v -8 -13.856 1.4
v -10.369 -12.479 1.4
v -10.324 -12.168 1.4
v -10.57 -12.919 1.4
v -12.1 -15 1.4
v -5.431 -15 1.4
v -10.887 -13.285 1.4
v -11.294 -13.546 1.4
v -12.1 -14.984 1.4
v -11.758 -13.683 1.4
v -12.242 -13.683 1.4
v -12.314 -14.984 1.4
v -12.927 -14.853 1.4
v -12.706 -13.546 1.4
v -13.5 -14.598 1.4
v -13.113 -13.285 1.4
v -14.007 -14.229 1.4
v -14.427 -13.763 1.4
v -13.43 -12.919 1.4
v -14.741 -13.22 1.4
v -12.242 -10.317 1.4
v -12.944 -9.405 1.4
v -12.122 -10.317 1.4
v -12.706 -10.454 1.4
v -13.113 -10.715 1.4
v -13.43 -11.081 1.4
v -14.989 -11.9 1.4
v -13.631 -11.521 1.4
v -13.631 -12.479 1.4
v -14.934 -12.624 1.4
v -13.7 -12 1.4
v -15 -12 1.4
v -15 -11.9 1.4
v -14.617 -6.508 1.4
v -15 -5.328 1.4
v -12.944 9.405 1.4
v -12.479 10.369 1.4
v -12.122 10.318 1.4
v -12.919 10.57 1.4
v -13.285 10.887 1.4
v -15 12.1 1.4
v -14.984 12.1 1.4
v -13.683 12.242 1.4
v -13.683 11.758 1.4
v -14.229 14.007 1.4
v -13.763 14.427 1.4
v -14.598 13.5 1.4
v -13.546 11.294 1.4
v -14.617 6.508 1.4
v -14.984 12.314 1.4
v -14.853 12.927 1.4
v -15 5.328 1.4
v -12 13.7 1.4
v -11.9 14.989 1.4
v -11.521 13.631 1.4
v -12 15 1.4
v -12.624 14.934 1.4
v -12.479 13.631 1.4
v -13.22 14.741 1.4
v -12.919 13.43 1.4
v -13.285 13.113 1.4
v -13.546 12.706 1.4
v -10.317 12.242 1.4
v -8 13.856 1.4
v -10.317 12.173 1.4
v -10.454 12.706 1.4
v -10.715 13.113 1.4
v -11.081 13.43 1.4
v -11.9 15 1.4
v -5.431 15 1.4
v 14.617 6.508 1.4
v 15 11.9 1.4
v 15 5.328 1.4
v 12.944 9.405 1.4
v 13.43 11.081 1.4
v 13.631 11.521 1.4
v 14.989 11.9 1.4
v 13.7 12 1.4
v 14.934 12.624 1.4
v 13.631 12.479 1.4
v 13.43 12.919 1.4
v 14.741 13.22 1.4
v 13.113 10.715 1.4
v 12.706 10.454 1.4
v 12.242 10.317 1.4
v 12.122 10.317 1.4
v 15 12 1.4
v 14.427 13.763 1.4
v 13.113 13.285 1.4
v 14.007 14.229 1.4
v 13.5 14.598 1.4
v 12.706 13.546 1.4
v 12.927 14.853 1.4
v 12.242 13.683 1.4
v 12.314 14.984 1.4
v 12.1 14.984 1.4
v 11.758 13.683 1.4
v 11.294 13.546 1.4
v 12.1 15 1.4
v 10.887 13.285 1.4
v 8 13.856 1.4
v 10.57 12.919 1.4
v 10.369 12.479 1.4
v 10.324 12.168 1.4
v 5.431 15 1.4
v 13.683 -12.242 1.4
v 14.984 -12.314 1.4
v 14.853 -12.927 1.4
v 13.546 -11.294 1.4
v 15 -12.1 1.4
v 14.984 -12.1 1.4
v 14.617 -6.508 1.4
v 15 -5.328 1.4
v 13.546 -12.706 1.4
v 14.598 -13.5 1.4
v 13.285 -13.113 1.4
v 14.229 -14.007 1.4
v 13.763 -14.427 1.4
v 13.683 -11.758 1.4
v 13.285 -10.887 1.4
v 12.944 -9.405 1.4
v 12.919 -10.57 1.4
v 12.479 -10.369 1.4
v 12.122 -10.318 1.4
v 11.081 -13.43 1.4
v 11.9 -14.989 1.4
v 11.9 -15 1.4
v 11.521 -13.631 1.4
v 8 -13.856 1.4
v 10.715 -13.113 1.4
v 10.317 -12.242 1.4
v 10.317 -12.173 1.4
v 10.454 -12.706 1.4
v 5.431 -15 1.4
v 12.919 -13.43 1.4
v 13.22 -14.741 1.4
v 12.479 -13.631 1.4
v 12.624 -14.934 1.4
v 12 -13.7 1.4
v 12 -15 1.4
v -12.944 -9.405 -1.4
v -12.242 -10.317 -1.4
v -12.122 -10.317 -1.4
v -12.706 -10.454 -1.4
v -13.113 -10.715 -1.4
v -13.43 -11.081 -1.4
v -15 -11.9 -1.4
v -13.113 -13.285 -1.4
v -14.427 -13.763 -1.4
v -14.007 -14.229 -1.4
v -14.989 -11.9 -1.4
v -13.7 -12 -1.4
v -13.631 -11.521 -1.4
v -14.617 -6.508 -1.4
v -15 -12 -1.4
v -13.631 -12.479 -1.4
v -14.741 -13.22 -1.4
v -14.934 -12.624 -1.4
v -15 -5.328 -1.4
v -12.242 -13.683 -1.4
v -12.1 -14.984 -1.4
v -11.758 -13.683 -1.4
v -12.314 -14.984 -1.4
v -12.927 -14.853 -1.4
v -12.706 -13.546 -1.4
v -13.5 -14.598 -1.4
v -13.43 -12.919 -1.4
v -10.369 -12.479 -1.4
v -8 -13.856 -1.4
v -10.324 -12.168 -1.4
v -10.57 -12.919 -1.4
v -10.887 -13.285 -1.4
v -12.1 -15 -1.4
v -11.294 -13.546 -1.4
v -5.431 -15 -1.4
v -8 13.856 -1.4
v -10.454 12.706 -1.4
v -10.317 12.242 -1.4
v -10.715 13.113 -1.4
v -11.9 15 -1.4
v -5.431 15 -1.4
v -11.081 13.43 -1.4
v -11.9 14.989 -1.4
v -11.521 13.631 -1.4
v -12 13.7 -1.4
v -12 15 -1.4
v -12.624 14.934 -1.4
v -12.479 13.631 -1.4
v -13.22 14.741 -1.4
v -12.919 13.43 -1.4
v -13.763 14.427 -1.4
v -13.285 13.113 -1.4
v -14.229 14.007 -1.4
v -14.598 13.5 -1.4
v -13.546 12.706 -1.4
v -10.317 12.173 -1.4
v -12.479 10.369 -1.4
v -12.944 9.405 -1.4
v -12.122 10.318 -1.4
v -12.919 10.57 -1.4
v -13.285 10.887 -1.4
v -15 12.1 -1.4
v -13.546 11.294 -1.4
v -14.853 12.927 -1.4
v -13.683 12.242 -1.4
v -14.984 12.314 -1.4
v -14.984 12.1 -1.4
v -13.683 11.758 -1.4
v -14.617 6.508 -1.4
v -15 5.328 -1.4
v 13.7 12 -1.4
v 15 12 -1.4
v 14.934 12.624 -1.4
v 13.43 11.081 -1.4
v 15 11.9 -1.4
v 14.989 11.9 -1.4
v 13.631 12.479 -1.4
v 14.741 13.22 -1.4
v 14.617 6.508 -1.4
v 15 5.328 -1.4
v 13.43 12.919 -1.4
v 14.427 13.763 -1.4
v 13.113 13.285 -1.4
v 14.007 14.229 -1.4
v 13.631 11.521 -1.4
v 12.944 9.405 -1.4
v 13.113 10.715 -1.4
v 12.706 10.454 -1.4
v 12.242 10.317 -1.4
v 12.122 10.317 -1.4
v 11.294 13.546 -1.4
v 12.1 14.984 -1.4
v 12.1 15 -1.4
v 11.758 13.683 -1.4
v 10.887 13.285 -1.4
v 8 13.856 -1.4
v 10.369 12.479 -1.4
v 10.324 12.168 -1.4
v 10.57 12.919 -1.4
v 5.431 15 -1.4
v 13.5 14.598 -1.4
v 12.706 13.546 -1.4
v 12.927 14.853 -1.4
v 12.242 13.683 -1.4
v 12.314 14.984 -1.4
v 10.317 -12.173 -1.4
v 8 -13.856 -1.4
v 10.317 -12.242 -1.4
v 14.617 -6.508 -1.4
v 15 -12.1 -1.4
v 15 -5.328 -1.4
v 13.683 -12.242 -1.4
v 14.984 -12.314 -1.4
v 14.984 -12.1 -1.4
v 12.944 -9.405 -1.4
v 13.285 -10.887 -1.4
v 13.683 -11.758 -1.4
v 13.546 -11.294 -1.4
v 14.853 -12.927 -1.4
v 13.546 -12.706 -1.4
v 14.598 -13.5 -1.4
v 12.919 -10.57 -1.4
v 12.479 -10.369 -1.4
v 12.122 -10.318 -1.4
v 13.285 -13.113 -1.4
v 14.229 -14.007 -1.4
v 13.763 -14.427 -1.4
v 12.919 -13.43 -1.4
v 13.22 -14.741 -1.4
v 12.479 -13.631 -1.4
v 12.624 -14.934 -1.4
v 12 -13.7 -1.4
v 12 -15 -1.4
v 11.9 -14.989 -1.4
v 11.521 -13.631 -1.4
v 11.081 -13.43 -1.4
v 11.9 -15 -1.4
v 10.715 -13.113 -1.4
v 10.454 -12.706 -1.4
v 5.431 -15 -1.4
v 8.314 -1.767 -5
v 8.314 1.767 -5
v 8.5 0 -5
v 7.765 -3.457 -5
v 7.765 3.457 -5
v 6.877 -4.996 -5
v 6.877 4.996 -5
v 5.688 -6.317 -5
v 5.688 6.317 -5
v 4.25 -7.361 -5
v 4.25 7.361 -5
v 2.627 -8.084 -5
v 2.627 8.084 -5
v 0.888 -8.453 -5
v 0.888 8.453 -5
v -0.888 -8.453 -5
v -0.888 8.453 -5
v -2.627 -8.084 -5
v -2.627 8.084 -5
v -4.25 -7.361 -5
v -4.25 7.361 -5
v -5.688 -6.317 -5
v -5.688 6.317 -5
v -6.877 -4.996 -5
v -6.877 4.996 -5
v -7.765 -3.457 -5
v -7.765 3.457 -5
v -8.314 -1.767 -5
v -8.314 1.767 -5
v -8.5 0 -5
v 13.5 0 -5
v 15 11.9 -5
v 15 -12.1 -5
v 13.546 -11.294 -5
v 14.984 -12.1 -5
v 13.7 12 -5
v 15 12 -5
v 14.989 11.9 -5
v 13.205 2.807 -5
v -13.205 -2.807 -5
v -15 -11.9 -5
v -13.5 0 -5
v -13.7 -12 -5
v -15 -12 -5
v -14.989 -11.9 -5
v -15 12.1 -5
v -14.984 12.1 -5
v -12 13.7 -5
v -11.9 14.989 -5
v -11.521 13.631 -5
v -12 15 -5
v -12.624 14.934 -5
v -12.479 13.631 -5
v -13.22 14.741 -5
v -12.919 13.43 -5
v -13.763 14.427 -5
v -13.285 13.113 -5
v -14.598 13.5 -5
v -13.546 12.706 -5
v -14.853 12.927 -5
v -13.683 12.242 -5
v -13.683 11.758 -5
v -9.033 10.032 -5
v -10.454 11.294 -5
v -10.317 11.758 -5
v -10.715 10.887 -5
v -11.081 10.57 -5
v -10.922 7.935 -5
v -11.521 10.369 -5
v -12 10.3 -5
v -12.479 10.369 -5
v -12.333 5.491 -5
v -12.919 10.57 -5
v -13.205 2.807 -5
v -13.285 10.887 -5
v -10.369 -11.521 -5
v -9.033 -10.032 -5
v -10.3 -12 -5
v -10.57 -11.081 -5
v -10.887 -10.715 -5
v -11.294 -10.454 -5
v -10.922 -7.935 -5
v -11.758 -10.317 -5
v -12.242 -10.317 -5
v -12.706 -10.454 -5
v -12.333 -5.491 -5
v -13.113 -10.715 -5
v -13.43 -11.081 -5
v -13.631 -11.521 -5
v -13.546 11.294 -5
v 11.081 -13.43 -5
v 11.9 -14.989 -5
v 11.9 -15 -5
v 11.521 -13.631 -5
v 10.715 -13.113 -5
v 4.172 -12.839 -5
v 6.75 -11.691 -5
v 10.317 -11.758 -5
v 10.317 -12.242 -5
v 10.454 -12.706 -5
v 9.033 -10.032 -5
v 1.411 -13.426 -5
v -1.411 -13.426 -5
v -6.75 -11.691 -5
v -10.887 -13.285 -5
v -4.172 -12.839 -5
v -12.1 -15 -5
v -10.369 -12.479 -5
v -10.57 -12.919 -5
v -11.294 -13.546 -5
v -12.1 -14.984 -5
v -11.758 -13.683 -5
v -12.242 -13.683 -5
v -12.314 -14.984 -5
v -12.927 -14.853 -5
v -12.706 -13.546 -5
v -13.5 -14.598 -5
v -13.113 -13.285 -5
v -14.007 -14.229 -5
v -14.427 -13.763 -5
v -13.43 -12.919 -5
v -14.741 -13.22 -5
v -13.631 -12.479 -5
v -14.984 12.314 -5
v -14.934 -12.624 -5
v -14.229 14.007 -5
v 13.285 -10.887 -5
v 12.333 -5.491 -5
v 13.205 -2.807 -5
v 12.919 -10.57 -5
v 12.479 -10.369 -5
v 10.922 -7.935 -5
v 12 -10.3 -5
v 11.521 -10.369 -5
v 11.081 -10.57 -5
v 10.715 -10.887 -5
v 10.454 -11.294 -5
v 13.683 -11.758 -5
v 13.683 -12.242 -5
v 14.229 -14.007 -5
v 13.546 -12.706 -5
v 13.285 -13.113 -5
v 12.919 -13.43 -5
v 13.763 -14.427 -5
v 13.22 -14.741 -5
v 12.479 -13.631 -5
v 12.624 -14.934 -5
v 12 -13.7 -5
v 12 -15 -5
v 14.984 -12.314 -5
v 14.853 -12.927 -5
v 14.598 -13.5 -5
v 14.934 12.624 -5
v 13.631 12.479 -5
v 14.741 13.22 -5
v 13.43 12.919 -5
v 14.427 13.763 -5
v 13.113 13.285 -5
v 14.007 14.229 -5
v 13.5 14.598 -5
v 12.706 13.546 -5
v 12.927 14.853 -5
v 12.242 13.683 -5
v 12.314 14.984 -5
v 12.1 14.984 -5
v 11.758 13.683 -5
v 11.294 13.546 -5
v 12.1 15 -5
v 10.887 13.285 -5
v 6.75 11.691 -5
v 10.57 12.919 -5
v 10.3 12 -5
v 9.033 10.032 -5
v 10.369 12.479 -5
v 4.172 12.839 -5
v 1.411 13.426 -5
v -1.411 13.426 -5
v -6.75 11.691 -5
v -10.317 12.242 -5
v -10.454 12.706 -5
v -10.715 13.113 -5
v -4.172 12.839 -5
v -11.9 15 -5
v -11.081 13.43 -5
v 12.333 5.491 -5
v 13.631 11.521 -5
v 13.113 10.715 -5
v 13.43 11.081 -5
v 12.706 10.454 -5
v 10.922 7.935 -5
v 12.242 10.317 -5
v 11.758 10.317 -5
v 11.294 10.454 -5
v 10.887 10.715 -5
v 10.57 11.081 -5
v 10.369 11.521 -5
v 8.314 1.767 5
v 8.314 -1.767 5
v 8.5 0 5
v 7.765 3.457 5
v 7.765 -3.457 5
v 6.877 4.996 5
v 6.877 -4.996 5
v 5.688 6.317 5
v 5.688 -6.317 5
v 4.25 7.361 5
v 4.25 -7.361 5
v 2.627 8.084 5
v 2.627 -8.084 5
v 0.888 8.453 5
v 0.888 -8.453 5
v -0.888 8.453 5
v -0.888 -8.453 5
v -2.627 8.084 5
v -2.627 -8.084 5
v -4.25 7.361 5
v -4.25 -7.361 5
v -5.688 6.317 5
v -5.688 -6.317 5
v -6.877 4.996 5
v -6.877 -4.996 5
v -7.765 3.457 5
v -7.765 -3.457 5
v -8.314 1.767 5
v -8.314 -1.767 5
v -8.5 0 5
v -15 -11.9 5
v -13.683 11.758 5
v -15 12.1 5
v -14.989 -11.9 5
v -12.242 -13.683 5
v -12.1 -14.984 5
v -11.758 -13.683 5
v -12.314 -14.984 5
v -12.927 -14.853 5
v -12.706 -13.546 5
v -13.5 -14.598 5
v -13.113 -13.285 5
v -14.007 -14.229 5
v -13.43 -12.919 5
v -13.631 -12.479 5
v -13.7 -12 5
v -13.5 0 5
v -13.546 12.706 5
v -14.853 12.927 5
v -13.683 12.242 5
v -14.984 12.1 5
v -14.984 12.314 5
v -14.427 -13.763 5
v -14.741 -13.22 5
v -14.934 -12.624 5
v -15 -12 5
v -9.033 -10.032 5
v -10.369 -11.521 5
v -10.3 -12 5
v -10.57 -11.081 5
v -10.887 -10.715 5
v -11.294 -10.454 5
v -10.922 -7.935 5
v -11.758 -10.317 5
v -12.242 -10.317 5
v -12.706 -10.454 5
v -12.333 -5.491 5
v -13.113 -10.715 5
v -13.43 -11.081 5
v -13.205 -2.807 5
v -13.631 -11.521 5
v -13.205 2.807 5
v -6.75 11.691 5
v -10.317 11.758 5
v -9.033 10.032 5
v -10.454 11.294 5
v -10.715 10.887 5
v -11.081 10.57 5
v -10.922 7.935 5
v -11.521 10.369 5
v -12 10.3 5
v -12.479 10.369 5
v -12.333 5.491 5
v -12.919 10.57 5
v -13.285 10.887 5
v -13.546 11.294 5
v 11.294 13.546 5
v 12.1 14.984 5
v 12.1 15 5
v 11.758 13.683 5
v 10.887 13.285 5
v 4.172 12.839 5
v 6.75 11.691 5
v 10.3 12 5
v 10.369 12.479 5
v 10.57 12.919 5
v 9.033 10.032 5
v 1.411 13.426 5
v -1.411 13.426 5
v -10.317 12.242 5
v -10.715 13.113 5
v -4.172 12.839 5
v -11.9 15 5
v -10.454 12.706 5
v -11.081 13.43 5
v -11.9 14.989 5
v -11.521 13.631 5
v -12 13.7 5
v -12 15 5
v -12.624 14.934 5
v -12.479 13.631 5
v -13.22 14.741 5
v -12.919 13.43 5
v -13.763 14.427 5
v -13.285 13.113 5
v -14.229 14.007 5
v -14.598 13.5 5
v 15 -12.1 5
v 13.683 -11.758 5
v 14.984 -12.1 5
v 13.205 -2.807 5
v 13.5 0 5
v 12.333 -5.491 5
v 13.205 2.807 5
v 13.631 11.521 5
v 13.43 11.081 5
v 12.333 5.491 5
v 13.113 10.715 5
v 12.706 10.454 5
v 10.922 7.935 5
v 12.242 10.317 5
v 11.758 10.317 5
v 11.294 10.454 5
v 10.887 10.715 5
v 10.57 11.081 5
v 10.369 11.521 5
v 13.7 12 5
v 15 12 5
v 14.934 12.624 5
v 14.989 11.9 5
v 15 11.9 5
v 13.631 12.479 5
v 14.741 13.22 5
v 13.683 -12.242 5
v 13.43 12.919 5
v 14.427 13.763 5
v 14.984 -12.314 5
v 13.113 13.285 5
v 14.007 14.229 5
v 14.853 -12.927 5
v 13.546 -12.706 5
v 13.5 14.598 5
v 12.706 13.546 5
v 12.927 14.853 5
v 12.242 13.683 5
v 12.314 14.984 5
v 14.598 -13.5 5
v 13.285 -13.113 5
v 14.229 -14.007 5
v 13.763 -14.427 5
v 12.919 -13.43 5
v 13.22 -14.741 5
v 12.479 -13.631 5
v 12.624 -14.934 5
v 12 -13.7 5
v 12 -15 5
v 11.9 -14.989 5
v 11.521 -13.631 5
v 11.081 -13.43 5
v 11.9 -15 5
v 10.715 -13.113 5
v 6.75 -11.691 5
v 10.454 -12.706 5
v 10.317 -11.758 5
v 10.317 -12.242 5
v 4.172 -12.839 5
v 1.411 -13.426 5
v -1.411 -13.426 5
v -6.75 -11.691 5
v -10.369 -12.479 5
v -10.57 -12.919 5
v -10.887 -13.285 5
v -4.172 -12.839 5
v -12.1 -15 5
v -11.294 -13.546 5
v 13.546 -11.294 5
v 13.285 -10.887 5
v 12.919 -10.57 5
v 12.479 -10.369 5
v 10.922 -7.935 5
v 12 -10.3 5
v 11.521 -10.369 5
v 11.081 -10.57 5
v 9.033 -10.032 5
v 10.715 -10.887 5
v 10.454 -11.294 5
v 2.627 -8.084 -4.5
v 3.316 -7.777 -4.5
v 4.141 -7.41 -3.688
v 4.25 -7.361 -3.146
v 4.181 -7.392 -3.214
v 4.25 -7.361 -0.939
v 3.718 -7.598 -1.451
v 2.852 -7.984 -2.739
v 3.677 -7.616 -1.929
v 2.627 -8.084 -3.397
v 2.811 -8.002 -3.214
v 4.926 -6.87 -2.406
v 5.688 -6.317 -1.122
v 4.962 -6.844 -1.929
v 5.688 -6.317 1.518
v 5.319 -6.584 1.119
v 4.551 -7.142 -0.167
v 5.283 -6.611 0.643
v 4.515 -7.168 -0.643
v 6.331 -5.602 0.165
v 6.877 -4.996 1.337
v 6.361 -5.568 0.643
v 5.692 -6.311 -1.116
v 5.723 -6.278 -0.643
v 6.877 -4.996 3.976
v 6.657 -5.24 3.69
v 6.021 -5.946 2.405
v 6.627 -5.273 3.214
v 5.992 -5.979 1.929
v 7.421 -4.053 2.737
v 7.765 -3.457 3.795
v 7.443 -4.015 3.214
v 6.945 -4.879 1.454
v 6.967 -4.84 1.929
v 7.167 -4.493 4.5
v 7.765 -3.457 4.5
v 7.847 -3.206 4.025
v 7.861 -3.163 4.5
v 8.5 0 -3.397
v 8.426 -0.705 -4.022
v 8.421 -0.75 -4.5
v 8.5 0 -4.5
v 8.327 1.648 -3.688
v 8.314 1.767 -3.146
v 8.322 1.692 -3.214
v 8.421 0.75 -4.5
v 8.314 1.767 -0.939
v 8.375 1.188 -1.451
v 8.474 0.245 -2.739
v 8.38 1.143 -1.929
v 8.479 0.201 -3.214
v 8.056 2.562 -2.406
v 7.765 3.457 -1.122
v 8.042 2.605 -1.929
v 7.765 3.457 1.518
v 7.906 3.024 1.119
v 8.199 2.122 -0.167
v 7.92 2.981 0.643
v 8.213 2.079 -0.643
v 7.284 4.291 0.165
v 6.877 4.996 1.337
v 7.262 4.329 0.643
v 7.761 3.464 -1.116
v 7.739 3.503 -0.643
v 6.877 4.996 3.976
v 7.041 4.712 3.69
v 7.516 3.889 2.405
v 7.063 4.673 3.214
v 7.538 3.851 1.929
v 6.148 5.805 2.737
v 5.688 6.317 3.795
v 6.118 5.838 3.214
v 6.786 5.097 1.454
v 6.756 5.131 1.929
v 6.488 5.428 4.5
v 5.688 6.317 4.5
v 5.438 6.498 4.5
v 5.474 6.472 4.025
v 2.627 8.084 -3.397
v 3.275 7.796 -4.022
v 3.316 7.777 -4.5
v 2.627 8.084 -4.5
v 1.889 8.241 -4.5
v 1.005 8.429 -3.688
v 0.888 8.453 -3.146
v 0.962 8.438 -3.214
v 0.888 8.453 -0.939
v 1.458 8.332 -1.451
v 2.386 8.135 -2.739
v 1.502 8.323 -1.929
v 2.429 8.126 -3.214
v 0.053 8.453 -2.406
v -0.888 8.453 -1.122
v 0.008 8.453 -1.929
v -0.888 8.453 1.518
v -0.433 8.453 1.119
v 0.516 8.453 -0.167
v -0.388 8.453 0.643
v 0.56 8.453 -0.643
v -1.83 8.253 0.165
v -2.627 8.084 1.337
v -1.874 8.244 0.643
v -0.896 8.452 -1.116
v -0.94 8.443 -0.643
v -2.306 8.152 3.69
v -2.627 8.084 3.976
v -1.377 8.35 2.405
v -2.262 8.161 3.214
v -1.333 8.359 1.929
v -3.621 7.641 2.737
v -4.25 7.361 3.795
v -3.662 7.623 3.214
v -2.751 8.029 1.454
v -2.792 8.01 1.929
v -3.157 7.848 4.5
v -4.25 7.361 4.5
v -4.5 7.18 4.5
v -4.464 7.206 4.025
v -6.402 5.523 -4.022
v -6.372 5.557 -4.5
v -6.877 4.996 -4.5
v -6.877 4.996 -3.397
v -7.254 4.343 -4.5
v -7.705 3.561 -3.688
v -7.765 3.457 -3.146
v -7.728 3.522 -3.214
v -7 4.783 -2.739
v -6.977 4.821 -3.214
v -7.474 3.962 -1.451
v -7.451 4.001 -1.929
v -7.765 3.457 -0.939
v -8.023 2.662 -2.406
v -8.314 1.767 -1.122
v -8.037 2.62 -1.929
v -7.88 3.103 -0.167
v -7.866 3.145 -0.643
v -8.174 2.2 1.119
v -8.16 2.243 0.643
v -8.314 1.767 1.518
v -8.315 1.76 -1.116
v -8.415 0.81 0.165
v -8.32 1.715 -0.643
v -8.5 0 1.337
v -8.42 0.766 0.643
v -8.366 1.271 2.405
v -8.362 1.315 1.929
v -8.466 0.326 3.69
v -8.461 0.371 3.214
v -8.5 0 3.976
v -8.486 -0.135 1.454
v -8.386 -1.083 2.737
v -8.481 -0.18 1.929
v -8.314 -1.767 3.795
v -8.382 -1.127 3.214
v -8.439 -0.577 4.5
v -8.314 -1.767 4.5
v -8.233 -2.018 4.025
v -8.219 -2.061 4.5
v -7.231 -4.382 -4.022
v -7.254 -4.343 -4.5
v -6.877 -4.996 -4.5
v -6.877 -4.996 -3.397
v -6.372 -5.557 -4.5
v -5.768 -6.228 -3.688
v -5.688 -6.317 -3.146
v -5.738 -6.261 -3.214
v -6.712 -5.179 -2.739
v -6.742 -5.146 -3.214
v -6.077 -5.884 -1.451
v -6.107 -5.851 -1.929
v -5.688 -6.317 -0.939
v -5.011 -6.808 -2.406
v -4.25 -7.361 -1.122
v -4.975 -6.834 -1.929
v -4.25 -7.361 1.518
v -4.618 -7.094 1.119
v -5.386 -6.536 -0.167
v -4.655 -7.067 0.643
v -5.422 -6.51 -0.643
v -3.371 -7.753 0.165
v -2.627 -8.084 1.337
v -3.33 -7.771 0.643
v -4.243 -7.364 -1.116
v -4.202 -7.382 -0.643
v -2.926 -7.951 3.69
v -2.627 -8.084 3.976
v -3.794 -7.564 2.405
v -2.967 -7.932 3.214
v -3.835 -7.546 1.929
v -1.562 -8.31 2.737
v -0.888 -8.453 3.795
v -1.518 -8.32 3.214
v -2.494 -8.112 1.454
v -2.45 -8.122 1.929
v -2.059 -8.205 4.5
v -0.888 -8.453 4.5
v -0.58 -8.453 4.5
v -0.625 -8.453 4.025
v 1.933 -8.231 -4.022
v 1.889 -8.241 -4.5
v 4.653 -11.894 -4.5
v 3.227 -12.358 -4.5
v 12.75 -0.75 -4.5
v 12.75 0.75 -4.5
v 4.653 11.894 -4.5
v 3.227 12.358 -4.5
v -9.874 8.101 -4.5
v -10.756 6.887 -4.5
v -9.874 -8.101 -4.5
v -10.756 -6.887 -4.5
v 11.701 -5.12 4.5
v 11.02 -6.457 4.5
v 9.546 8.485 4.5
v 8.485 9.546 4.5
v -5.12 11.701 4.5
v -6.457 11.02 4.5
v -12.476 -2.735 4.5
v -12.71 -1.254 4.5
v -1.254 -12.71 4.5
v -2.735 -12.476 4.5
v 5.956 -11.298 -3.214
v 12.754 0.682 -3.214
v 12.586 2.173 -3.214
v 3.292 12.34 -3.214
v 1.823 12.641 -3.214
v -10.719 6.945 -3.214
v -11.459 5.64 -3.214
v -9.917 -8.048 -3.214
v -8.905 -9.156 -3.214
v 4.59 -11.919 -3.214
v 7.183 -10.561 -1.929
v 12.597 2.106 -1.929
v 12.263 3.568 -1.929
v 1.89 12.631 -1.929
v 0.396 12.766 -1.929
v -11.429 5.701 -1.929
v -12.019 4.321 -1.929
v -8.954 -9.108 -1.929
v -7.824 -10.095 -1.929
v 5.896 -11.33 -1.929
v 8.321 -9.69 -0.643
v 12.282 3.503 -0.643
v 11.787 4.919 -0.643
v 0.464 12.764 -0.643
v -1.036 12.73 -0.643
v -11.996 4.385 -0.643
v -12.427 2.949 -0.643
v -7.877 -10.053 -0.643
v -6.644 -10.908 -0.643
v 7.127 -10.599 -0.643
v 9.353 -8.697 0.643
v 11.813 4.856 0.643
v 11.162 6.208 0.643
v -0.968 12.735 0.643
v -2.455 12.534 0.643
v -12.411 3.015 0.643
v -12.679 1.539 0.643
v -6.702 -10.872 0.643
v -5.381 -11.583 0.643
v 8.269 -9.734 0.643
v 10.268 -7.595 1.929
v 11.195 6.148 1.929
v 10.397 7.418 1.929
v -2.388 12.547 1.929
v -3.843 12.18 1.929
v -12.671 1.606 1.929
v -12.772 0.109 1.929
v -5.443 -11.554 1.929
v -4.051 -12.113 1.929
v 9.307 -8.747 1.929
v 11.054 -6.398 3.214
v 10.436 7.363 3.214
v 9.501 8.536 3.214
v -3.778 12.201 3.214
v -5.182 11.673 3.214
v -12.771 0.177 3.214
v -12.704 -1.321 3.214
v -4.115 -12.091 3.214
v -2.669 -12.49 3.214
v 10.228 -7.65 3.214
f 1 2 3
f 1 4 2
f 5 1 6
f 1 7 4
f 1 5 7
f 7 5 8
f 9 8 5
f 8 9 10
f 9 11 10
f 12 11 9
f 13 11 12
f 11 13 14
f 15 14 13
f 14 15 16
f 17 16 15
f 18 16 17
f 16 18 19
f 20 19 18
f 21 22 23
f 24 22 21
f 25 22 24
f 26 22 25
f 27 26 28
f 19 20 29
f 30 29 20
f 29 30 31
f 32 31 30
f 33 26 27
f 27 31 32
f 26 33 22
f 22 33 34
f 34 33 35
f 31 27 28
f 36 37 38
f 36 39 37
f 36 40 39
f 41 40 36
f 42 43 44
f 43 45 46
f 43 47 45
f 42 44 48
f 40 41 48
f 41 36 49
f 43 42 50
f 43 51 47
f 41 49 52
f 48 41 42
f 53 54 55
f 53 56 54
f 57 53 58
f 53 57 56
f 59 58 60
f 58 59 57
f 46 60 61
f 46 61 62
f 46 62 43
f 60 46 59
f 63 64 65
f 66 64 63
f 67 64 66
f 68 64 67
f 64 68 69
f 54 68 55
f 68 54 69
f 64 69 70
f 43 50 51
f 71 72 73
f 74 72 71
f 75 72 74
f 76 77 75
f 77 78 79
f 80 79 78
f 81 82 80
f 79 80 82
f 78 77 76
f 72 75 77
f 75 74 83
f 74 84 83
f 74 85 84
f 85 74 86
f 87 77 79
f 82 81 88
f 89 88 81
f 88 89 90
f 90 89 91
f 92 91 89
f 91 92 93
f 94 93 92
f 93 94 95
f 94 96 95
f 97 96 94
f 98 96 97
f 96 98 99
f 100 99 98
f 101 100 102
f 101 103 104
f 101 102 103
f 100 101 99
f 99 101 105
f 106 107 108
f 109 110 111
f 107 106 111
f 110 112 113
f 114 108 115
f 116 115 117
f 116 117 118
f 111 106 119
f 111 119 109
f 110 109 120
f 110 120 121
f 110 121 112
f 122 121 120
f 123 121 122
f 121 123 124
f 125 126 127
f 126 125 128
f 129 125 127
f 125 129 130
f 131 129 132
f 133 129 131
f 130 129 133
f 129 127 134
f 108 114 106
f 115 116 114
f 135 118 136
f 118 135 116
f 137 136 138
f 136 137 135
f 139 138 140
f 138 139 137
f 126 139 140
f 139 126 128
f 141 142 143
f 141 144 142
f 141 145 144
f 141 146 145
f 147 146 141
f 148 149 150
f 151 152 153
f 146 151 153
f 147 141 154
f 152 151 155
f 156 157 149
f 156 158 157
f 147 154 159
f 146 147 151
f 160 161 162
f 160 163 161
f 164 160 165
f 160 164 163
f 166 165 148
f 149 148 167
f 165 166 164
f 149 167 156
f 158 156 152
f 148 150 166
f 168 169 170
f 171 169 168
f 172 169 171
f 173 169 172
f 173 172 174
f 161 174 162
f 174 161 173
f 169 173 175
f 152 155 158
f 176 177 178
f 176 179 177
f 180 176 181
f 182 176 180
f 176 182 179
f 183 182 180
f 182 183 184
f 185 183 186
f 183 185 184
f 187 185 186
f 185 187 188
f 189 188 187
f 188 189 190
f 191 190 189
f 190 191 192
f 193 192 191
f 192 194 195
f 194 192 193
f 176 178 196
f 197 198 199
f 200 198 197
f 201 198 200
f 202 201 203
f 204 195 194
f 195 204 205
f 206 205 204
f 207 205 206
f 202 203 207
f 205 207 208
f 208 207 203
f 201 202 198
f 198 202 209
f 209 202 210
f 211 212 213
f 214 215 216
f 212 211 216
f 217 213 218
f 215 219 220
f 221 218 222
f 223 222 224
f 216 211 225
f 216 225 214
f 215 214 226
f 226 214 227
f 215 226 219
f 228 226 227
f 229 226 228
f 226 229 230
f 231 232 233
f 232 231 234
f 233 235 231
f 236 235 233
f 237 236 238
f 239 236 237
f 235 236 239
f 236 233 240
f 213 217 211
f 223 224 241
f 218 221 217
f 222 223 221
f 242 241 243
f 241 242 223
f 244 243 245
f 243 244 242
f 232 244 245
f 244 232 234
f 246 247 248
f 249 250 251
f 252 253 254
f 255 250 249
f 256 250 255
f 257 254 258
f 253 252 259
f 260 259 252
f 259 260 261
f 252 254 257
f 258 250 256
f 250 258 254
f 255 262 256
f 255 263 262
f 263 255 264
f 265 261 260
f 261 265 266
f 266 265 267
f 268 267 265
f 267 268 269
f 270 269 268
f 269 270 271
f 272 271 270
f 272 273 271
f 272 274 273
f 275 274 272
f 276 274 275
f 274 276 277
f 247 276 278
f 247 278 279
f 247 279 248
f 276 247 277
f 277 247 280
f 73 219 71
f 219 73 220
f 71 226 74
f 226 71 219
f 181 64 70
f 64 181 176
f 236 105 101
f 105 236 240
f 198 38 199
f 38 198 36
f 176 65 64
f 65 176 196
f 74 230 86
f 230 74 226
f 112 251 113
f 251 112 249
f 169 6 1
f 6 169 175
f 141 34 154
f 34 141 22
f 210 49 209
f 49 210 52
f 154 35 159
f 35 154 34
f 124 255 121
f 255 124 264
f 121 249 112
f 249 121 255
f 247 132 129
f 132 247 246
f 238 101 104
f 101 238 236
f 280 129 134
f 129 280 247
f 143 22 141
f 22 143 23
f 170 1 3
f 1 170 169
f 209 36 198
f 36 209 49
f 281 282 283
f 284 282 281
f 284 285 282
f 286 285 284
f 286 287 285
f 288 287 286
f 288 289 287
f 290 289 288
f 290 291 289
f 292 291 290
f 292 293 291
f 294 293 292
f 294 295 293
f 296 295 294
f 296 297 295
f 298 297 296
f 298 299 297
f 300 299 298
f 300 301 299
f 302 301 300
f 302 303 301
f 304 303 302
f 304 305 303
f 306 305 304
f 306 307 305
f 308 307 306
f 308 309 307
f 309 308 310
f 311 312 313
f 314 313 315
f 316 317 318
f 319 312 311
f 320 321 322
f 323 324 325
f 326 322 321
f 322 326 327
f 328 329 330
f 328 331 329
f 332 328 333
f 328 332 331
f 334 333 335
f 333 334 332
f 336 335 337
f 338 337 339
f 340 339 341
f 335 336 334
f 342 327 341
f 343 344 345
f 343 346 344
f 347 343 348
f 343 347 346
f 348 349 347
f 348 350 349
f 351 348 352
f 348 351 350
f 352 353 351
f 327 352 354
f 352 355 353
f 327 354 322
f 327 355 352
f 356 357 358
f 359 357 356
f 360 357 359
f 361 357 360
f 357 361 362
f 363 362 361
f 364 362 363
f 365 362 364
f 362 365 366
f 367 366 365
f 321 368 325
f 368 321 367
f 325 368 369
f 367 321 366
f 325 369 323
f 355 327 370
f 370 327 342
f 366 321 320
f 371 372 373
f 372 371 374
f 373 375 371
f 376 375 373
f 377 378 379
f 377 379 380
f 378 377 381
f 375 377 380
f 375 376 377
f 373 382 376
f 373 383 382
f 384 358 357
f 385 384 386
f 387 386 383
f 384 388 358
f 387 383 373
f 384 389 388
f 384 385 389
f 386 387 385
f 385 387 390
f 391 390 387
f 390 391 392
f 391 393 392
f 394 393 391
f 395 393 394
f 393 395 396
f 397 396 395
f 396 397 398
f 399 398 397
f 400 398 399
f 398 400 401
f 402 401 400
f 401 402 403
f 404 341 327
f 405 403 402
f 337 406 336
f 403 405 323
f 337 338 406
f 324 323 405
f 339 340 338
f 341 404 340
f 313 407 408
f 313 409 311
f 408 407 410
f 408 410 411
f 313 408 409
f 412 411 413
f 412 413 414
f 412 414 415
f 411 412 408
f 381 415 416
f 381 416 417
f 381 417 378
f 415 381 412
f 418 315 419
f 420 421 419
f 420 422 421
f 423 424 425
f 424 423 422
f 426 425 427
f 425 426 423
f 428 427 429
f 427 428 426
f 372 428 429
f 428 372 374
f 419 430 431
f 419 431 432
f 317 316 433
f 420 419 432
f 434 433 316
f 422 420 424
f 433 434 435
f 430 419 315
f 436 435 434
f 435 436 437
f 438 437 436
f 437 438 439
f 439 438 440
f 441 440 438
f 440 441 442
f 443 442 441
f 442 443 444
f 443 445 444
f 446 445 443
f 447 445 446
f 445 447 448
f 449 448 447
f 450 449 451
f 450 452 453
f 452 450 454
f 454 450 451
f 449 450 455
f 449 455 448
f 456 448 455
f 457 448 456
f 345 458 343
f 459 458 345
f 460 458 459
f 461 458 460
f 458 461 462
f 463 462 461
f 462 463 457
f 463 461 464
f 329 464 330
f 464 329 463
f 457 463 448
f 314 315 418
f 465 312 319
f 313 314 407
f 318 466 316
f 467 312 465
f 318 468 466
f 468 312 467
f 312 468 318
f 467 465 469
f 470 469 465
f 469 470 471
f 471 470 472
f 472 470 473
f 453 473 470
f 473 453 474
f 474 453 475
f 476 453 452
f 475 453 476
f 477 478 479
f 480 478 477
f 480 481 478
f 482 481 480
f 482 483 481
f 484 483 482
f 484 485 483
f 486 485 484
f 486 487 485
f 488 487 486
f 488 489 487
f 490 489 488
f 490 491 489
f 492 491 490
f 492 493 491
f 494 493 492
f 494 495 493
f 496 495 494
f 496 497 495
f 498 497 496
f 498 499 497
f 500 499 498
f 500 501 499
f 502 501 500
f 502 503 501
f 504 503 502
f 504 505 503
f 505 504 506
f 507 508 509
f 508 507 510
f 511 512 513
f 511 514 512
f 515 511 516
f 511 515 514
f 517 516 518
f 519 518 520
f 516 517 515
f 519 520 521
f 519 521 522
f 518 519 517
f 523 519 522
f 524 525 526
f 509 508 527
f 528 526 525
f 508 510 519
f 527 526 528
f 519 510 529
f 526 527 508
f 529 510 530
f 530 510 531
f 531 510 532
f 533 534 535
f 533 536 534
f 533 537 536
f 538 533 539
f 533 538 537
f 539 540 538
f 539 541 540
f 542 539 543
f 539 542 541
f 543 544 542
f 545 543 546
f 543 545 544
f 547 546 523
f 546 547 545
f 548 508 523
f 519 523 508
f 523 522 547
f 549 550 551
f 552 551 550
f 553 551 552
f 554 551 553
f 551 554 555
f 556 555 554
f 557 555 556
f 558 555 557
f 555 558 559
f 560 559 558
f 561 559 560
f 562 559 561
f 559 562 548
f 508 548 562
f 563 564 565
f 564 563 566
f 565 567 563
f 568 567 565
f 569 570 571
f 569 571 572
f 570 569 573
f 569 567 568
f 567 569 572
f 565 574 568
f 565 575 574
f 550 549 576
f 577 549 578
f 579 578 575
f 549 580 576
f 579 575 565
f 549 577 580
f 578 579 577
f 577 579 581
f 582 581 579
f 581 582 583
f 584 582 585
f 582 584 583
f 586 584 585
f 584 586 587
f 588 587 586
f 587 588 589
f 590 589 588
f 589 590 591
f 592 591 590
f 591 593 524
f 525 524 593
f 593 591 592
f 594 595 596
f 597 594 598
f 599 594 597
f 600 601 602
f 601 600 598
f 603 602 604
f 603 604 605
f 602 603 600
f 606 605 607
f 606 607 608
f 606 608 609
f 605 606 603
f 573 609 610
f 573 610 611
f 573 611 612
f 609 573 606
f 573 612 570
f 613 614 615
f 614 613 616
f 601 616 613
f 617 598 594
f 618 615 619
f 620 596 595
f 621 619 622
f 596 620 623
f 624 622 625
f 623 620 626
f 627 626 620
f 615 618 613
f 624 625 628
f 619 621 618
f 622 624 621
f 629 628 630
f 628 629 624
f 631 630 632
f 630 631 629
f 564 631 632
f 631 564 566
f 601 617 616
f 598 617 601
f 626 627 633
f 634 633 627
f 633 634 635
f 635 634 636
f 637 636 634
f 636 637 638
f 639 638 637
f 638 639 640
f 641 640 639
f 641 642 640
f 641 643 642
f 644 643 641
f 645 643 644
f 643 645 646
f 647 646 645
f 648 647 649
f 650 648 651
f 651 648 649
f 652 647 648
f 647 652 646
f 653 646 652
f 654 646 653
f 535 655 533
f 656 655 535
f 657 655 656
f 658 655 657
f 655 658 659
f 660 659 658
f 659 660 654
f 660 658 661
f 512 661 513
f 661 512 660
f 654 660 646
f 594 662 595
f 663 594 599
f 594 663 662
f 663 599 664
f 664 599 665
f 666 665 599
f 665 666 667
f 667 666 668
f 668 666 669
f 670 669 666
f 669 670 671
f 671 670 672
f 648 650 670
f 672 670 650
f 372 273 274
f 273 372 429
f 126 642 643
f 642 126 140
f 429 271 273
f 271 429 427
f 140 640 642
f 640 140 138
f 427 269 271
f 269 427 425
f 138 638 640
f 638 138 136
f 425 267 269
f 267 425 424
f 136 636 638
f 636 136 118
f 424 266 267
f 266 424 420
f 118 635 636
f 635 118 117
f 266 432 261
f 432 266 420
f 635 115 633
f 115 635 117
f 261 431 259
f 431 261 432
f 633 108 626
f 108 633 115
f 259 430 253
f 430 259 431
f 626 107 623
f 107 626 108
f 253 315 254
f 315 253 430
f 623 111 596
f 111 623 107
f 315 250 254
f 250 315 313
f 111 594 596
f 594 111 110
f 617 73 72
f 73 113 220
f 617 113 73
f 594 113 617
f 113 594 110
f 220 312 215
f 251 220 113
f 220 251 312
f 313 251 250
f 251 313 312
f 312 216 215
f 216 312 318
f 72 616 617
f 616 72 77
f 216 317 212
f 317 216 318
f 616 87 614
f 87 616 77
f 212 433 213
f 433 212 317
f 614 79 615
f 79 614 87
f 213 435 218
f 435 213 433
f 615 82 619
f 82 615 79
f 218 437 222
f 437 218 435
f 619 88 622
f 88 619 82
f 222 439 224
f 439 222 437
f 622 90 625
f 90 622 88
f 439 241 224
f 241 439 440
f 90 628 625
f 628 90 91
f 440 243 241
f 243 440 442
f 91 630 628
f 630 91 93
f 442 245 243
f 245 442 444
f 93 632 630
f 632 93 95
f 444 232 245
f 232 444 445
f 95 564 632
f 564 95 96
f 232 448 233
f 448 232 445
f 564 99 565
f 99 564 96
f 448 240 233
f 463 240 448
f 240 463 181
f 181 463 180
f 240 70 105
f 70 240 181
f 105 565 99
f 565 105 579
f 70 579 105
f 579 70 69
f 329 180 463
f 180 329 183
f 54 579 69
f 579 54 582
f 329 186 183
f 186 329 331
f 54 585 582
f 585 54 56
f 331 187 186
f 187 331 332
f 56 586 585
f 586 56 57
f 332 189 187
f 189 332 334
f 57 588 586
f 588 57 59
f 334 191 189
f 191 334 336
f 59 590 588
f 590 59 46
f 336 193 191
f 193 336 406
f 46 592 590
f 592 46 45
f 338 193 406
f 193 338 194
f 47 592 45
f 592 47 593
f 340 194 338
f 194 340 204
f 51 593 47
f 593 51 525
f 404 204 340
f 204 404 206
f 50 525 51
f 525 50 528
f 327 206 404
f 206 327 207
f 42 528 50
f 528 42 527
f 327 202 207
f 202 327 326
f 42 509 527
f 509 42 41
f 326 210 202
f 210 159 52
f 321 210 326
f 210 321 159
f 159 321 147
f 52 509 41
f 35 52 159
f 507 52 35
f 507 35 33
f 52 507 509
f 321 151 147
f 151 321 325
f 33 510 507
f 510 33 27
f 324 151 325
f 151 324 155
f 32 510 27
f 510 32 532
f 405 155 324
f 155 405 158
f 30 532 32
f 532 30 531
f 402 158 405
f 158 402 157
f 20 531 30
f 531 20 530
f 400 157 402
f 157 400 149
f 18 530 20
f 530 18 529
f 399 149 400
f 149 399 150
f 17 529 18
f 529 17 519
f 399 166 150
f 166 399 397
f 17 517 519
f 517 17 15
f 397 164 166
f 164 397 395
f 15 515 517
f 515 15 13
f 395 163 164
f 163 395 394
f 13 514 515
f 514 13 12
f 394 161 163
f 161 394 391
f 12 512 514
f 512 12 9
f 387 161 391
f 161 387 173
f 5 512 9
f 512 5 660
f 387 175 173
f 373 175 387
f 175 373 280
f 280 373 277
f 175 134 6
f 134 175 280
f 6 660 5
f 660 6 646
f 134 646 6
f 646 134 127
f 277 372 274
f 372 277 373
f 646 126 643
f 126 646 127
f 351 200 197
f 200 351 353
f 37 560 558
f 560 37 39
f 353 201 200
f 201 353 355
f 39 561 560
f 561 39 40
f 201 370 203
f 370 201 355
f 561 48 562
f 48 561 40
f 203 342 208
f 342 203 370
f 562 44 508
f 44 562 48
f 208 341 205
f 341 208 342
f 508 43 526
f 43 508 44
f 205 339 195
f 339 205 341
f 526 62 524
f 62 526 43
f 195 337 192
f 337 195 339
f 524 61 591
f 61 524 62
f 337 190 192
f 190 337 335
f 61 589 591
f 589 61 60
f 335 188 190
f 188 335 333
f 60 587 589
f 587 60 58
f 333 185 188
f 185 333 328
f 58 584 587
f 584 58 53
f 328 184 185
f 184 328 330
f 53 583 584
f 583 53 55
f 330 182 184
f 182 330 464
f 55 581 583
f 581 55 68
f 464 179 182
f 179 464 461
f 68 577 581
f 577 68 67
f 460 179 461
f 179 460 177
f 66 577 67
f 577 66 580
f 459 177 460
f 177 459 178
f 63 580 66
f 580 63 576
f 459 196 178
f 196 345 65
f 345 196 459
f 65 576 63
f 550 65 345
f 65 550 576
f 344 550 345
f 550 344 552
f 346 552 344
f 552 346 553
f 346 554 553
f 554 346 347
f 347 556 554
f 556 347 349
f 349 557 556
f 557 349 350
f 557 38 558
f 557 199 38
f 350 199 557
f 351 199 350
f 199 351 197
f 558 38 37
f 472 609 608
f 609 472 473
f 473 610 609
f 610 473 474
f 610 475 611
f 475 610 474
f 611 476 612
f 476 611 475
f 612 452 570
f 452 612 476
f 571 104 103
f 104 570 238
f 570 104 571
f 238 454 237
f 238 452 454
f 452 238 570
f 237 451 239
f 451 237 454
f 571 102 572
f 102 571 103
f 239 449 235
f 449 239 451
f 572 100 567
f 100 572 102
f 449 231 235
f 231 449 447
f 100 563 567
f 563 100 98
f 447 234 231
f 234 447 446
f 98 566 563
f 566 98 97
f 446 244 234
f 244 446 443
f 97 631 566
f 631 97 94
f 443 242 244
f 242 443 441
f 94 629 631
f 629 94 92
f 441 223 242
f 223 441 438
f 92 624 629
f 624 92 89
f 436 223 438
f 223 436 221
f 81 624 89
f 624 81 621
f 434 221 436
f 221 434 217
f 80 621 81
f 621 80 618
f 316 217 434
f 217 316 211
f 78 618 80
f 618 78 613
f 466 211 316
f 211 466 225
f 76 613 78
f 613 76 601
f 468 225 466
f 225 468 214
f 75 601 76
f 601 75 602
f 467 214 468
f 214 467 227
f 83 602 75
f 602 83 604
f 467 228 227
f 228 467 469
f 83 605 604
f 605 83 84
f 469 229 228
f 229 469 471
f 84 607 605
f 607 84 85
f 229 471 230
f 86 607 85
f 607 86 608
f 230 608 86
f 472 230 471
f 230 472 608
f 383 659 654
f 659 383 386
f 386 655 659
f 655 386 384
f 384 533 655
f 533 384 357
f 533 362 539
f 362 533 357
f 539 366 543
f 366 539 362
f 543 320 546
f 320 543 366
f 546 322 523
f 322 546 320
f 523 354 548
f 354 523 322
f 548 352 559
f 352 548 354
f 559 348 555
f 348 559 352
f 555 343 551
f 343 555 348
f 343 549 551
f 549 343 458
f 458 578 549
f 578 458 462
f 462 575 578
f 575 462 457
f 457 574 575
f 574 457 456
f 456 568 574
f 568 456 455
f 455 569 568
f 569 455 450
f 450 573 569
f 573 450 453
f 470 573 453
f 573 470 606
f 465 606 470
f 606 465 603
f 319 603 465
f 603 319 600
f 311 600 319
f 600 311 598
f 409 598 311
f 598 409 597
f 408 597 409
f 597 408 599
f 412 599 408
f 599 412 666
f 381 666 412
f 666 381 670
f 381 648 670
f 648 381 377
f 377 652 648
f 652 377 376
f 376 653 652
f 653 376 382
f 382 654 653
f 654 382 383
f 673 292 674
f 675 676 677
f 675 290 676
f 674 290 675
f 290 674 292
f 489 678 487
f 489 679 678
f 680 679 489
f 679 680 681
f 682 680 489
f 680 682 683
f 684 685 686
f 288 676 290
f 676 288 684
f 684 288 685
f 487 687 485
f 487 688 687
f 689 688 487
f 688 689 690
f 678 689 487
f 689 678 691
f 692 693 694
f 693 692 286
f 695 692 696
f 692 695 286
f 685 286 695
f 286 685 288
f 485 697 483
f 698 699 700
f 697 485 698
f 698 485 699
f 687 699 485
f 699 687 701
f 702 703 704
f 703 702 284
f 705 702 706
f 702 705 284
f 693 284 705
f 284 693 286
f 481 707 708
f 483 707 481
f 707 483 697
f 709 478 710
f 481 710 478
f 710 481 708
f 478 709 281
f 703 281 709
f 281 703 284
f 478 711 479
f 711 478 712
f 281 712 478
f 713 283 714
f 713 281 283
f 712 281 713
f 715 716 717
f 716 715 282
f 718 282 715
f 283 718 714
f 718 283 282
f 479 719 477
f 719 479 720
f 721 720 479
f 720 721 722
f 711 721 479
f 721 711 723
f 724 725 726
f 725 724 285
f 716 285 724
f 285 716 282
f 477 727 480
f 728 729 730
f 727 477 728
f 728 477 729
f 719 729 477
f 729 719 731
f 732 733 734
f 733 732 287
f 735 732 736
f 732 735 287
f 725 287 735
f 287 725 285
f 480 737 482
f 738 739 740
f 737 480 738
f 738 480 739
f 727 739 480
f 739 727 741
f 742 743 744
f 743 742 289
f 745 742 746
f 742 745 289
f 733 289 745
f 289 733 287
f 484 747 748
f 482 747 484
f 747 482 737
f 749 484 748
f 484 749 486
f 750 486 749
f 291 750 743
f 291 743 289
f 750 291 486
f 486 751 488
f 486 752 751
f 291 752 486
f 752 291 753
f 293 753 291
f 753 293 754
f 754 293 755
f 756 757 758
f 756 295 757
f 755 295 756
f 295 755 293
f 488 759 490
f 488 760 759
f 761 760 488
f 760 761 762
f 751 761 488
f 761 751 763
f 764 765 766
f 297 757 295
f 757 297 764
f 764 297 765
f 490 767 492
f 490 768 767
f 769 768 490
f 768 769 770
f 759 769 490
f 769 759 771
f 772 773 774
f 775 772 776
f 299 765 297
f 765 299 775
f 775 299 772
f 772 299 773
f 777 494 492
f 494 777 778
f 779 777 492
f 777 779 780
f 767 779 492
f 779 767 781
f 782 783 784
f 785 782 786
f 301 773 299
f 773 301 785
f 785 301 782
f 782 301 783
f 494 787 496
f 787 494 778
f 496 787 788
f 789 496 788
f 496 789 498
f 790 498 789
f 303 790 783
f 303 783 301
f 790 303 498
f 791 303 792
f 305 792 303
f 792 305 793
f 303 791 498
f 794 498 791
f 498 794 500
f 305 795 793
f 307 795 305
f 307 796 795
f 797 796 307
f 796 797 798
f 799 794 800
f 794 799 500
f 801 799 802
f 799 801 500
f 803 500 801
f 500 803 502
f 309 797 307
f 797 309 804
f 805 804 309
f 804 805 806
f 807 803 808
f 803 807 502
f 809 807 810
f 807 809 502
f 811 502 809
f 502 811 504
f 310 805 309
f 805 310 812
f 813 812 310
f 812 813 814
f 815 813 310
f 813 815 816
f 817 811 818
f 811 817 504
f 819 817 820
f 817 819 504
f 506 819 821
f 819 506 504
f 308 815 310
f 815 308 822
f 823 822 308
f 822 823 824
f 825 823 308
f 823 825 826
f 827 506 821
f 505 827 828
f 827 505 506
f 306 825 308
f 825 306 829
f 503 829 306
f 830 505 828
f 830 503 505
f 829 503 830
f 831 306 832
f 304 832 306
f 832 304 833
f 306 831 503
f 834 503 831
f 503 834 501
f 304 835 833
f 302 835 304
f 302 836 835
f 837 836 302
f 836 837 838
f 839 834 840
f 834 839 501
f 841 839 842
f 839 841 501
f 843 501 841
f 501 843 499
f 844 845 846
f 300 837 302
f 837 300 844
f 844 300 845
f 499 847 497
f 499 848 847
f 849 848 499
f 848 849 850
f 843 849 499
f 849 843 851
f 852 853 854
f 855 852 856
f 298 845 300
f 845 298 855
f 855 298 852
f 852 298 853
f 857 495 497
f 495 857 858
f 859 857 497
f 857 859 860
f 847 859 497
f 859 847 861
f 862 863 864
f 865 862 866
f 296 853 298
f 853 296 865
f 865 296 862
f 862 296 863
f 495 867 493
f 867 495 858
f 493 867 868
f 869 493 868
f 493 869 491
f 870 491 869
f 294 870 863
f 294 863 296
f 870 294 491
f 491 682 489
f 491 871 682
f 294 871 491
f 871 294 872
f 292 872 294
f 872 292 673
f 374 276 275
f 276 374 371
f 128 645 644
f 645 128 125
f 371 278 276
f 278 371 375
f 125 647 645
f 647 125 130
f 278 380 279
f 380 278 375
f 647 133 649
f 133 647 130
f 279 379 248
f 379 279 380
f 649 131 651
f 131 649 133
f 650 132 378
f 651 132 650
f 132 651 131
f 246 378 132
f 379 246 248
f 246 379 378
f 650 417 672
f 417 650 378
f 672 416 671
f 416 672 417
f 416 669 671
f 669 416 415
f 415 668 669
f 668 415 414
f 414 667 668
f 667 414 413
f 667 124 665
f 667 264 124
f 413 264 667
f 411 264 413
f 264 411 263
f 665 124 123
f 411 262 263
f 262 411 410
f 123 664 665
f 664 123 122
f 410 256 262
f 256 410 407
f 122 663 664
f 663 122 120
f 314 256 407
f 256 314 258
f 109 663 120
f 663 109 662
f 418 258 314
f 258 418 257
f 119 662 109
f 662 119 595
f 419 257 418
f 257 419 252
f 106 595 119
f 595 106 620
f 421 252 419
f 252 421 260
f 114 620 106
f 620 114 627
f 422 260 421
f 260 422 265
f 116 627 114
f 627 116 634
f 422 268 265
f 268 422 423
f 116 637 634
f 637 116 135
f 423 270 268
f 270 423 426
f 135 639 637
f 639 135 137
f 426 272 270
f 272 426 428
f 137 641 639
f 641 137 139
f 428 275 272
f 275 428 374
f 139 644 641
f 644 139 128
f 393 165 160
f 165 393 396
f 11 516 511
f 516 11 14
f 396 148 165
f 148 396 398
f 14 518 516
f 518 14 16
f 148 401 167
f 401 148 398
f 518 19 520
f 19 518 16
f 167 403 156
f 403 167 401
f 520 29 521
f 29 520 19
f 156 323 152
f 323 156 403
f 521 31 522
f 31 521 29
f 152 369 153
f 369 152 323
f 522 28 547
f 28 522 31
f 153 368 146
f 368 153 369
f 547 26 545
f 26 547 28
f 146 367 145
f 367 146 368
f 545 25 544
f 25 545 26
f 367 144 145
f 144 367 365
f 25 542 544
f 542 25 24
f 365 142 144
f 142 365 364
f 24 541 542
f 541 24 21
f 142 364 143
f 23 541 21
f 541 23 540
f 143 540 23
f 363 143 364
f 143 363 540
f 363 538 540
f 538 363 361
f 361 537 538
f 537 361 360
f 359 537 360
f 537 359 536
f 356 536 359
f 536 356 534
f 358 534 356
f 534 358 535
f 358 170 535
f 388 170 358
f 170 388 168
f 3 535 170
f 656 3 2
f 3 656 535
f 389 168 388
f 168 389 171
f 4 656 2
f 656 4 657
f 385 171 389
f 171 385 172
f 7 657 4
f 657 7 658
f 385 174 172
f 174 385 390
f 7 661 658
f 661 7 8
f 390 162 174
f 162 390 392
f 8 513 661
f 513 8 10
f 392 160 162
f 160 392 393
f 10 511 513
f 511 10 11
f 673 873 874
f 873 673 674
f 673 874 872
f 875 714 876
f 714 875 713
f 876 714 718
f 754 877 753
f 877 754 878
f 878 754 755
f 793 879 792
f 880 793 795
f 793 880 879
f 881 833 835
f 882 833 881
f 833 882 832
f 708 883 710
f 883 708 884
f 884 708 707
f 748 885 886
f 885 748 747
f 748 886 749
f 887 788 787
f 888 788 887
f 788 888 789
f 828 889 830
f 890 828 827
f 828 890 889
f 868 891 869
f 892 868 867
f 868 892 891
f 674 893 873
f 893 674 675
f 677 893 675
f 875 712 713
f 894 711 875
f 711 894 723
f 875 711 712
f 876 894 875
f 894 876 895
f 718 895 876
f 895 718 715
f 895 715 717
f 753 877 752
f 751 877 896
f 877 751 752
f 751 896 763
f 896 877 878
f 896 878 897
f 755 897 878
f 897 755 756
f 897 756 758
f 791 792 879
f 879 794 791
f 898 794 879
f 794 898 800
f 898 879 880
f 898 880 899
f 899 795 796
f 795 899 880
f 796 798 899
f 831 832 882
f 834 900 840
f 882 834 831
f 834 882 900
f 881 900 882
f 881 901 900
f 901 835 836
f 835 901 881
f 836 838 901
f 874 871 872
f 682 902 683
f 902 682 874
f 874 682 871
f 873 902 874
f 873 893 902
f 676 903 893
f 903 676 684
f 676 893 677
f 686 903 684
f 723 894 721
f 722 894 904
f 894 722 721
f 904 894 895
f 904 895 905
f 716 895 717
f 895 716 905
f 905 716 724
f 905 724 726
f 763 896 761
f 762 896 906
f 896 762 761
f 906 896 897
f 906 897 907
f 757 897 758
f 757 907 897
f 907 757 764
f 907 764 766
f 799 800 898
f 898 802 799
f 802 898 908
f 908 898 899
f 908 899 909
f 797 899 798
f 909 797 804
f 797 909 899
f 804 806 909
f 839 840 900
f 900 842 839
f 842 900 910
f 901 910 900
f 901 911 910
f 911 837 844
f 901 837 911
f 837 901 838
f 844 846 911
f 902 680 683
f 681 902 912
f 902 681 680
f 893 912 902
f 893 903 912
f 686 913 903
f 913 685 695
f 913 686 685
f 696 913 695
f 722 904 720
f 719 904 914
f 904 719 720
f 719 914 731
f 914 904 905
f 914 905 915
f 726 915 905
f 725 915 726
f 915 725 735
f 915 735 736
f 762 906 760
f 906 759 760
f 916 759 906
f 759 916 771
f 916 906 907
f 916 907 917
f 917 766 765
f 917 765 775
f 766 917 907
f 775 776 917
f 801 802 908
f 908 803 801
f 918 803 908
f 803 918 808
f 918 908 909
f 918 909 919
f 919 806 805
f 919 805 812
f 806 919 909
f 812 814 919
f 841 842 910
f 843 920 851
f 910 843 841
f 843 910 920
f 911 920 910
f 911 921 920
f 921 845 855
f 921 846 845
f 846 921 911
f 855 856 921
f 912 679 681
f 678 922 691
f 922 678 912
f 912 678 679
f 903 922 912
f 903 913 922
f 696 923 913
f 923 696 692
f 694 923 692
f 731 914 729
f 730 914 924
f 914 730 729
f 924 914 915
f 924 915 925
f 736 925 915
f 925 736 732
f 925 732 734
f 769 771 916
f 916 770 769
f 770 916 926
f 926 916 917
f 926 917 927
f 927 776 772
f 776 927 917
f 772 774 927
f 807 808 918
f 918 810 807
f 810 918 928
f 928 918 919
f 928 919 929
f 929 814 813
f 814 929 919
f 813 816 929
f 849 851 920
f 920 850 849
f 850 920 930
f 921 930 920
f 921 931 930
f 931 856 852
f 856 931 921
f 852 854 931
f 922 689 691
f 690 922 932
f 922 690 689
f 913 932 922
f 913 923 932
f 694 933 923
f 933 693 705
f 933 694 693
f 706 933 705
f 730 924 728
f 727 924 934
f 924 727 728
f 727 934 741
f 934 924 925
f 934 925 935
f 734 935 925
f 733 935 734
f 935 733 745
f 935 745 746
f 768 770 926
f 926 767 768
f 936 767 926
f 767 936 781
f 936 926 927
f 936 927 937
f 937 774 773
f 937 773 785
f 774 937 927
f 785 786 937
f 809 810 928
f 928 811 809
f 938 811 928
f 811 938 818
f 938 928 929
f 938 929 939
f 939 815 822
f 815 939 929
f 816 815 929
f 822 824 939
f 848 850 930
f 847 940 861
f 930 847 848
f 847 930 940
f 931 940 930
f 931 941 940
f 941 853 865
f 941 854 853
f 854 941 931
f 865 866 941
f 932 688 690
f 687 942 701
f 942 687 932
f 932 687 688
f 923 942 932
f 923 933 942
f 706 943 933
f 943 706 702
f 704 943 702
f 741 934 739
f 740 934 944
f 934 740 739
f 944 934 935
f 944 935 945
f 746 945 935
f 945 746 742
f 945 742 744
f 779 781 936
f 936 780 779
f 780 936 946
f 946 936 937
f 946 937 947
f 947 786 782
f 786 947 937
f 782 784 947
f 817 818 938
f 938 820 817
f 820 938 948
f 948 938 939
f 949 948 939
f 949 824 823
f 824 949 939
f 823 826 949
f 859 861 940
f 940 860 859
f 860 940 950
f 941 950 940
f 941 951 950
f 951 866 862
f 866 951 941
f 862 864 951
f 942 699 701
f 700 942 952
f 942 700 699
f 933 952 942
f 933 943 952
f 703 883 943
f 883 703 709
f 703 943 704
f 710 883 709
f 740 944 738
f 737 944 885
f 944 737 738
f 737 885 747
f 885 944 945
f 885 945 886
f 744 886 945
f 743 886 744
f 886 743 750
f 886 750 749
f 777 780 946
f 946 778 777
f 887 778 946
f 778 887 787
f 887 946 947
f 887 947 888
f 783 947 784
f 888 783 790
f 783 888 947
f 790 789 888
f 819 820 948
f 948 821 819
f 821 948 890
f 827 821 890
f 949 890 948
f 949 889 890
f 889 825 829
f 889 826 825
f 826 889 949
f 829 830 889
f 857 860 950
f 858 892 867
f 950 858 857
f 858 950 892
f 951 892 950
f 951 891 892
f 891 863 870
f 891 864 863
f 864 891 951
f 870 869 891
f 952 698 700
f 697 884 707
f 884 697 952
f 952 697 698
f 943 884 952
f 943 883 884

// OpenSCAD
// file: ../press_fit.scad
include <config.scad>

module press_fit(d=0, h=0, center=false) {

	linear_extrude(height=h, center=center)
		minkowski() {
			square([d/3,d/3], center=true);
			circle(r=d/3);
		}
}

difference() {
	press_fit(d=20, h=24, center=true);
	cylinder(d=20, h=24+e, center=true);
}
// file: ../standard.scad
BOLT_D = [
	-1, //0 index is not used but reduces computation
	-1,
	-1,
	2.980,	//m3
	3.978,	//m4
	4.976,	//m5
	5.974,	//m6
	-1,
	7.972,	//m8
	-1,
	9.968,	//m10
	-1,
	11.966	//m12
];

NUT_D = [
	-1, //0 index is not used but reduces computation
	-1,
	-1,
	6.40,	//m3
	8.10,	//m4
	9.20,	//m5
	11.50,	//m6
	-1,
	15.00,	//m8
	-1,
	19.60,	//m10
	-1,
	22.10	//m12
];

NUT_H = [
	-1, //0 index is not used but reduces computation
	-1,
	-1,
	2.40,	//m3
	3.20,	//m4
	4.00,	//m5
	5.00,	//m6
	-1,
	6.50,	//m8
	-1,
	8.00,	//m10
	-1,
	10.00	//m12
];

NEMA_F = [	//faceplate size
	-1,-1,-1,-1,-1,-1,-1,-1,-1,-1,-1,
	28.0,	//Nema11
	-1,-1,
	35.6,	//Nema14
	-1,-1,
	42.3,	//Nema17
	-1,-1,-1,-1,-1,
	58.4	//Nema23
];

NEMA_H = [	//halved distance between holes
	-1,-1,-1,-1,-1,-1,-1,-1,-1,-1,-1,
	11.50,	//Nema11
	-1,-1,
	13.00,	//Nema14
	-1,-1,
	15.50,	//Nema17
	-1,-1,-1,-1,-1,
	23.57	//Nema23
];

NEMA_S = [	//shaft diameter
	-1,-1,-1,-1,-1,-1,-1,-1,-1,-1,-1,
	4.0,	//Nema11
	-1,-1,
	5.0,	//Nema14
	-1,-1,
	5.0,	//Nema17
	-1,-1,-1,-1,-1,
	6.35	//Nema23
];
// file: ../config.scad
include <standard.scad>

//render & print
$fs=.5;						//minimum arc segment
e=.1;						//extra length for manfold mesh (do not change)
tol=.5;						//xy compensation for small holes

				//
x=50*cos($t*360);			// printhead position
y=40*sin($t*360);			//
z=50*sin($t*360);

/*
x=0;			// printhead position
y=0;			//
z=0;
*/

wall=5/2;					//(some) thin wall thickness

//frame
f_t=10;						//frame thickness
f_x=200;
f_y=200;
f_z=65;
f_tr=8;						//corner threaded rods ISO diameter 
fy_ko=2;					//keepout between frame and x_carriage

//microswitch
ms_h=6;						//height
ms_l=13;					//length
ms_t=6;						//thickness

//motors
ab_motor=17;				//xy motors
ab_motor_l=47;				//xy motors length
z_motor=17;					//z motor
z_motor_l=47;				//z motor length
z_h=100;
z_h_extra=16.5;

//x
x_d=15;						//bearing diameter
x_l=24;						//bearing length
x_s=8;						//shaft diameter
x_fan=30;					//hotend fan diameter
x_blower=35;				//blower fan diameter
x_fans_m=6;					//fan and blower mount holes spacing

x_fan_duct=28;
x_blower_duct=25;
x_shroud=10;
x_shroud_t=5;
x_shroud_w=2;


//y
y_d=15;						//bearing diameter
y_l=24;						//bearing length
y_s=8;						//shaft diameter
y_shaft_distance_extra=3;	//extra distance between shafts
y_sp=6;						//shaft position (relative to frame)


//z
z_s=8;						//shaft diameter
z_l=24*2;					//bearing length
z_d=15;						//bearing diameter


//idler
idler_d=8;					//groove bearing OD
idler_l=3;					//groove bearing thickness
idler_s=3;					//groove bearing ID

idler_hk=2;					//idler horizontal keepout
idler_vk=.5;				//idler verical keepout (washer thickness?)

//pulley
pulley_d=200/PI/5;			//5 steps per mm (80 with 16x microstepping)
pulley_h=2;
pulley_rivet=1.5;
pulley_flat_shaft=true;

//bed
bed_x=100;
bed_y=100;

// ------
//  math
// ------
pulley_length = pulley_h+4*pulley_rivet+NUT_D[3];
pulley_diameter = pulley_d+pulley_rivet*2;
pulley_wire_height = pulley_h/2+pulley_rivet*2+NUT_D[3];
pulley_screw_length = (pulley_diameter-NEMA_S[17])/2;

y_shaft_distance = NEMA_F[ab_motor]+y_s+y_shaft_distance_extra;

x_shaft_distance = y_shaft_distance-y_d-y_s;

ab_motor_xpos = f_x/2-f_t-y_sp-y_d/2-wall;
ab_motor_ypos = f_y/2-f_t-(NEMA_H[ab_motor]*2+BOLT_D[3])/2+(f_t-f_tr)/2;


z_shaft_distance = bed_x/2-wall;
z_carriage_arm = NEMA_F[ab_motor]/2+y_l/2+x_d/2+wall+x_fan/2;
z_carriage_arm_max = ab_motor_ypos+f_y/2-f_t-x_fan/2;

//COLORS
abs="OrangeRed";
pla="SteelBlue";
shaft="DarkGray";
fan=[.1, .1, .1];
mdf="BurlyWood";

abs_="LightSteelBlue";
bearing_inside=fan;
bearing_outside=shaft;
blower=fan;
e3d="Silver";
heatbed="Silver";
th_rods=shaft;
nema_body=fan;
nema_plate=shaft;


use <press_fit.scad>
// main file
// Remixed from MiseryBot's original work: http://www.thingiverse.com/thing:8063

include <../config.scad>

fan(30, 10, 24, blade_num=5);

module fan(width, depth, mount, mount_diameter=3.4, corner_radius=3, blade_angle=-45, blade_num=5)
{
  bore_diameter = width - 3;
  
  color(fan) {
    body(width, depth, bore_diameter, mount, mount_diameter, corner_radius);
    fan_blades(bore_diameter, depth, blade_angle, blade_num);
  }
}

module body(width, depth, bore_diameter, mount, mount_diameter, corner_radius)
{
  difference()
  {
    linear_extrude(height=depth, center = true, convexity = 4, twist = 0)
    {
      difference()
      {
        square([width, width], center=true);
        inside_bore(bore_diameter, width/2 + 2);
        mounting_holes(mount/2, mount_diameter/2, depth+0.2);
        round_corners(width/2, corner_radius);
      }
    }

    outside_ring(width, depth);
  }
}

module inside_bore(diameter, hub)
{
  difference()
  {
    circle(r=diameter/2,center=true);
    circle(r=hub/2,center=true);
  }
}

module mounting_holes(offset, r, h)
{
  for (i=[0:3])
  {
    rotate([0,0,i*90])
    {
      translate([offset, offset])
      {
        circle(r=r, h=h, center=true);
      }
    }
  }
}

module round_corners(offset, r=5)
{
  for(i=[0:3])
  {
    rotate([0,0,i*90])
    {
      translate([offset,offset])
      {
        difference()
        {
          translate([-r+0.1, -r-0.1])
          {
            square([r+0.2, r+0.2]);
          }

          translate([-r, -r])
          {
            circle(r=r);
          }
        }
      }
    }
  }
}

module outside_ring(width, depth, surface_thickness=3.6)
{
  difference()
  {
    cylinder(r=width*.75, h=depth-2*surface_thickness, center=true);
    cylinder(r=(width+2)/2, h=depth-2*surface_thickness+0.2, center=true);
  }
}

module fan_blades(width, depth, angle, blade_num=5)
{ 
  $fn=50;
	
  linear_extrude(height=depth-1, center = true, convexity = 4, twist = angle)
  {
    for(i=[0:blade_num-1])
    rotate((360*i)/blade_num)
    translate([0,-1.5/2]) square([width/2-0.75,1.5]);
  }
}
